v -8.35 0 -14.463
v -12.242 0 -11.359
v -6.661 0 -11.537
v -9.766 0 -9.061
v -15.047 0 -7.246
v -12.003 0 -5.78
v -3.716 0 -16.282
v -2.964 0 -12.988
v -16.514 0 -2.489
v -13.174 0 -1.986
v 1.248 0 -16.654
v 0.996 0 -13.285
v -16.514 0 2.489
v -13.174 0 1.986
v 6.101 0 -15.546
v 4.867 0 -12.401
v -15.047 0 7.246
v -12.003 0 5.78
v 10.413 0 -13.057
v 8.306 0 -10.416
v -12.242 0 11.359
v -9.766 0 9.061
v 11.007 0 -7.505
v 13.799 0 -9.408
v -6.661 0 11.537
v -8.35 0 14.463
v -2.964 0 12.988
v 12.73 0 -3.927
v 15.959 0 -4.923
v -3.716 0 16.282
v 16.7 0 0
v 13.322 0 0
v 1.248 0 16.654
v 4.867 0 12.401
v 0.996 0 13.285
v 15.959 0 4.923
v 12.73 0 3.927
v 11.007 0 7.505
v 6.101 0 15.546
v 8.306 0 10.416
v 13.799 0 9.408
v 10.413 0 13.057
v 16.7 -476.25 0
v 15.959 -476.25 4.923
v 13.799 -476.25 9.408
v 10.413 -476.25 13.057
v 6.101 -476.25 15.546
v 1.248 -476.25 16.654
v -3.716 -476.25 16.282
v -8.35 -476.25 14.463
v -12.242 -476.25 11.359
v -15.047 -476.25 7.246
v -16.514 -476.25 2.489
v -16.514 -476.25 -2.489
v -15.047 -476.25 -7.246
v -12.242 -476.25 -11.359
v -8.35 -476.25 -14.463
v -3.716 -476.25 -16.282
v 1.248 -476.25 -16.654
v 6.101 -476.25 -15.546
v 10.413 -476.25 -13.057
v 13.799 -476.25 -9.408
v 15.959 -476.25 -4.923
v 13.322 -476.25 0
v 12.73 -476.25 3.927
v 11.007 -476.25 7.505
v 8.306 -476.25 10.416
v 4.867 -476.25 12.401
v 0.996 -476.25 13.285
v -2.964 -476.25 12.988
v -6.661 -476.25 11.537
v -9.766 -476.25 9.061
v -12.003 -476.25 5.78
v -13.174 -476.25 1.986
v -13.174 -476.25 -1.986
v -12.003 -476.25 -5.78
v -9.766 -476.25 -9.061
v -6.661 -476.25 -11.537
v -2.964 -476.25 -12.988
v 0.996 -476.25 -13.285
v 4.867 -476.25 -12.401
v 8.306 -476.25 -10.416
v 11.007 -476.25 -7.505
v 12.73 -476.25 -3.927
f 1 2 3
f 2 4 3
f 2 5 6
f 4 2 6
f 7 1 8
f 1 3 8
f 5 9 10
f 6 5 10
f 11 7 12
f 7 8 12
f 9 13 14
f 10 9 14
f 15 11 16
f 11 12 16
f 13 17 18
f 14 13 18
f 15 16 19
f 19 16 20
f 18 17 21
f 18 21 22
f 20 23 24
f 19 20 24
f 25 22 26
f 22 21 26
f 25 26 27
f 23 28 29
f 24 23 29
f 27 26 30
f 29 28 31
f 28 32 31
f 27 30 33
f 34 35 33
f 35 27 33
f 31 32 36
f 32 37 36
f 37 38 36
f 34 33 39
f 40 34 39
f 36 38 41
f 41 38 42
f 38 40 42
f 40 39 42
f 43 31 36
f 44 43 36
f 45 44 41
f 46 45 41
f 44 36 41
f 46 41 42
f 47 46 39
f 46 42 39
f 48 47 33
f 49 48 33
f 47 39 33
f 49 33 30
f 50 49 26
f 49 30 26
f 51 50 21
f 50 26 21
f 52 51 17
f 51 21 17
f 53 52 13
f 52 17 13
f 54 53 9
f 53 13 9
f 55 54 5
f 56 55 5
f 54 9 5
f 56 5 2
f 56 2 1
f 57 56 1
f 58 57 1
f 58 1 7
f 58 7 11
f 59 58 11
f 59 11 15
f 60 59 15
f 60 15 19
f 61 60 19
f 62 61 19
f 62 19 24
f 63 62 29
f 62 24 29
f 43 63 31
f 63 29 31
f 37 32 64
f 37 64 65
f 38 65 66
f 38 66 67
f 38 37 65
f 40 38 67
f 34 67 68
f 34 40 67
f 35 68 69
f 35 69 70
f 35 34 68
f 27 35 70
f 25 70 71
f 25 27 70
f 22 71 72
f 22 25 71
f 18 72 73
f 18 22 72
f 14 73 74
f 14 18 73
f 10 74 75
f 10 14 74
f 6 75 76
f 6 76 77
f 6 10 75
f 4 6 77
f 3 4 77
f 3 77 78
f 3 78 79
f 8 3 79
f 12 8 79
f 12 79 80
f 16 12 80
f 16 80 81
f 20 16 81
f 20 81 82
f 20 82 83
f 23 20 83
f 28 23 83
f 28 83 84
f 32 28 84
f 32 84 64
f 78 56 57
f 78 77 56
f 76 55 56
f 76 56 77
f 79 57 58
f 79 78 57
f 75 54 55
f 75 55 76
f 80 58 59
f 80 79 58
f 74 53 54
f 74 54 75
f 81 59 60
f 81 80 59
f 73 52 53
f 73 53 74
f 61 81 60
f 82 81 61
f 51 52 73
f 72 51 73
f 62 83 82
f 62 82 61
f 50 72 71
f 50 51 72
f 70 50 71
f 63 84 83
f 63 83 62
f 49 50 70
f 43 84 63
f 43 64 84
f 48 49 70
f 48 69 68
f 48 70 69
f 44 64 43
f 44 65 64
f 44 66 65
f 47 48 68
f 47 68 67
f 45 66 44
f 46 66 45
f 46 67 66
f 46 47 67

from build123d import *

# Parameters (mm, degrees)
CYLINDER_R          = 16.7005
CYLINDER_DEPTH      = 476.25
CYLINDER_ROLL_ANGLE = 90
THICKNESS001_T      = -3.3782


with BuildPart() as part:
    # Cylinder → Cylinder (new body)
    with BuildSketch(Plane.XY):
        Circle(CYLINDER_R)
    extrude(amount=CYLINDER_DEPTH)


with BuildPart() as part_1:
    # Cylinder roll: moved
    add(part.part.rotate(Axis((0, 0, 0), (1, 0, 0)), CYLINDER_ROLL_ANGLE))


with BuildPart() as part_2:
    # Cylinder placement: moved
    add(part_1.part)

    # Thickness001
    thickness001_openings = [part_2.faces().sort_by_distance(p)[0] for p in [
        (0, 0, 0),
        (0, -476.25, 0),
    ]]
    offset(amount=THICKNESS001_T, openings=thickness001_openings)


solid = part_2.part
